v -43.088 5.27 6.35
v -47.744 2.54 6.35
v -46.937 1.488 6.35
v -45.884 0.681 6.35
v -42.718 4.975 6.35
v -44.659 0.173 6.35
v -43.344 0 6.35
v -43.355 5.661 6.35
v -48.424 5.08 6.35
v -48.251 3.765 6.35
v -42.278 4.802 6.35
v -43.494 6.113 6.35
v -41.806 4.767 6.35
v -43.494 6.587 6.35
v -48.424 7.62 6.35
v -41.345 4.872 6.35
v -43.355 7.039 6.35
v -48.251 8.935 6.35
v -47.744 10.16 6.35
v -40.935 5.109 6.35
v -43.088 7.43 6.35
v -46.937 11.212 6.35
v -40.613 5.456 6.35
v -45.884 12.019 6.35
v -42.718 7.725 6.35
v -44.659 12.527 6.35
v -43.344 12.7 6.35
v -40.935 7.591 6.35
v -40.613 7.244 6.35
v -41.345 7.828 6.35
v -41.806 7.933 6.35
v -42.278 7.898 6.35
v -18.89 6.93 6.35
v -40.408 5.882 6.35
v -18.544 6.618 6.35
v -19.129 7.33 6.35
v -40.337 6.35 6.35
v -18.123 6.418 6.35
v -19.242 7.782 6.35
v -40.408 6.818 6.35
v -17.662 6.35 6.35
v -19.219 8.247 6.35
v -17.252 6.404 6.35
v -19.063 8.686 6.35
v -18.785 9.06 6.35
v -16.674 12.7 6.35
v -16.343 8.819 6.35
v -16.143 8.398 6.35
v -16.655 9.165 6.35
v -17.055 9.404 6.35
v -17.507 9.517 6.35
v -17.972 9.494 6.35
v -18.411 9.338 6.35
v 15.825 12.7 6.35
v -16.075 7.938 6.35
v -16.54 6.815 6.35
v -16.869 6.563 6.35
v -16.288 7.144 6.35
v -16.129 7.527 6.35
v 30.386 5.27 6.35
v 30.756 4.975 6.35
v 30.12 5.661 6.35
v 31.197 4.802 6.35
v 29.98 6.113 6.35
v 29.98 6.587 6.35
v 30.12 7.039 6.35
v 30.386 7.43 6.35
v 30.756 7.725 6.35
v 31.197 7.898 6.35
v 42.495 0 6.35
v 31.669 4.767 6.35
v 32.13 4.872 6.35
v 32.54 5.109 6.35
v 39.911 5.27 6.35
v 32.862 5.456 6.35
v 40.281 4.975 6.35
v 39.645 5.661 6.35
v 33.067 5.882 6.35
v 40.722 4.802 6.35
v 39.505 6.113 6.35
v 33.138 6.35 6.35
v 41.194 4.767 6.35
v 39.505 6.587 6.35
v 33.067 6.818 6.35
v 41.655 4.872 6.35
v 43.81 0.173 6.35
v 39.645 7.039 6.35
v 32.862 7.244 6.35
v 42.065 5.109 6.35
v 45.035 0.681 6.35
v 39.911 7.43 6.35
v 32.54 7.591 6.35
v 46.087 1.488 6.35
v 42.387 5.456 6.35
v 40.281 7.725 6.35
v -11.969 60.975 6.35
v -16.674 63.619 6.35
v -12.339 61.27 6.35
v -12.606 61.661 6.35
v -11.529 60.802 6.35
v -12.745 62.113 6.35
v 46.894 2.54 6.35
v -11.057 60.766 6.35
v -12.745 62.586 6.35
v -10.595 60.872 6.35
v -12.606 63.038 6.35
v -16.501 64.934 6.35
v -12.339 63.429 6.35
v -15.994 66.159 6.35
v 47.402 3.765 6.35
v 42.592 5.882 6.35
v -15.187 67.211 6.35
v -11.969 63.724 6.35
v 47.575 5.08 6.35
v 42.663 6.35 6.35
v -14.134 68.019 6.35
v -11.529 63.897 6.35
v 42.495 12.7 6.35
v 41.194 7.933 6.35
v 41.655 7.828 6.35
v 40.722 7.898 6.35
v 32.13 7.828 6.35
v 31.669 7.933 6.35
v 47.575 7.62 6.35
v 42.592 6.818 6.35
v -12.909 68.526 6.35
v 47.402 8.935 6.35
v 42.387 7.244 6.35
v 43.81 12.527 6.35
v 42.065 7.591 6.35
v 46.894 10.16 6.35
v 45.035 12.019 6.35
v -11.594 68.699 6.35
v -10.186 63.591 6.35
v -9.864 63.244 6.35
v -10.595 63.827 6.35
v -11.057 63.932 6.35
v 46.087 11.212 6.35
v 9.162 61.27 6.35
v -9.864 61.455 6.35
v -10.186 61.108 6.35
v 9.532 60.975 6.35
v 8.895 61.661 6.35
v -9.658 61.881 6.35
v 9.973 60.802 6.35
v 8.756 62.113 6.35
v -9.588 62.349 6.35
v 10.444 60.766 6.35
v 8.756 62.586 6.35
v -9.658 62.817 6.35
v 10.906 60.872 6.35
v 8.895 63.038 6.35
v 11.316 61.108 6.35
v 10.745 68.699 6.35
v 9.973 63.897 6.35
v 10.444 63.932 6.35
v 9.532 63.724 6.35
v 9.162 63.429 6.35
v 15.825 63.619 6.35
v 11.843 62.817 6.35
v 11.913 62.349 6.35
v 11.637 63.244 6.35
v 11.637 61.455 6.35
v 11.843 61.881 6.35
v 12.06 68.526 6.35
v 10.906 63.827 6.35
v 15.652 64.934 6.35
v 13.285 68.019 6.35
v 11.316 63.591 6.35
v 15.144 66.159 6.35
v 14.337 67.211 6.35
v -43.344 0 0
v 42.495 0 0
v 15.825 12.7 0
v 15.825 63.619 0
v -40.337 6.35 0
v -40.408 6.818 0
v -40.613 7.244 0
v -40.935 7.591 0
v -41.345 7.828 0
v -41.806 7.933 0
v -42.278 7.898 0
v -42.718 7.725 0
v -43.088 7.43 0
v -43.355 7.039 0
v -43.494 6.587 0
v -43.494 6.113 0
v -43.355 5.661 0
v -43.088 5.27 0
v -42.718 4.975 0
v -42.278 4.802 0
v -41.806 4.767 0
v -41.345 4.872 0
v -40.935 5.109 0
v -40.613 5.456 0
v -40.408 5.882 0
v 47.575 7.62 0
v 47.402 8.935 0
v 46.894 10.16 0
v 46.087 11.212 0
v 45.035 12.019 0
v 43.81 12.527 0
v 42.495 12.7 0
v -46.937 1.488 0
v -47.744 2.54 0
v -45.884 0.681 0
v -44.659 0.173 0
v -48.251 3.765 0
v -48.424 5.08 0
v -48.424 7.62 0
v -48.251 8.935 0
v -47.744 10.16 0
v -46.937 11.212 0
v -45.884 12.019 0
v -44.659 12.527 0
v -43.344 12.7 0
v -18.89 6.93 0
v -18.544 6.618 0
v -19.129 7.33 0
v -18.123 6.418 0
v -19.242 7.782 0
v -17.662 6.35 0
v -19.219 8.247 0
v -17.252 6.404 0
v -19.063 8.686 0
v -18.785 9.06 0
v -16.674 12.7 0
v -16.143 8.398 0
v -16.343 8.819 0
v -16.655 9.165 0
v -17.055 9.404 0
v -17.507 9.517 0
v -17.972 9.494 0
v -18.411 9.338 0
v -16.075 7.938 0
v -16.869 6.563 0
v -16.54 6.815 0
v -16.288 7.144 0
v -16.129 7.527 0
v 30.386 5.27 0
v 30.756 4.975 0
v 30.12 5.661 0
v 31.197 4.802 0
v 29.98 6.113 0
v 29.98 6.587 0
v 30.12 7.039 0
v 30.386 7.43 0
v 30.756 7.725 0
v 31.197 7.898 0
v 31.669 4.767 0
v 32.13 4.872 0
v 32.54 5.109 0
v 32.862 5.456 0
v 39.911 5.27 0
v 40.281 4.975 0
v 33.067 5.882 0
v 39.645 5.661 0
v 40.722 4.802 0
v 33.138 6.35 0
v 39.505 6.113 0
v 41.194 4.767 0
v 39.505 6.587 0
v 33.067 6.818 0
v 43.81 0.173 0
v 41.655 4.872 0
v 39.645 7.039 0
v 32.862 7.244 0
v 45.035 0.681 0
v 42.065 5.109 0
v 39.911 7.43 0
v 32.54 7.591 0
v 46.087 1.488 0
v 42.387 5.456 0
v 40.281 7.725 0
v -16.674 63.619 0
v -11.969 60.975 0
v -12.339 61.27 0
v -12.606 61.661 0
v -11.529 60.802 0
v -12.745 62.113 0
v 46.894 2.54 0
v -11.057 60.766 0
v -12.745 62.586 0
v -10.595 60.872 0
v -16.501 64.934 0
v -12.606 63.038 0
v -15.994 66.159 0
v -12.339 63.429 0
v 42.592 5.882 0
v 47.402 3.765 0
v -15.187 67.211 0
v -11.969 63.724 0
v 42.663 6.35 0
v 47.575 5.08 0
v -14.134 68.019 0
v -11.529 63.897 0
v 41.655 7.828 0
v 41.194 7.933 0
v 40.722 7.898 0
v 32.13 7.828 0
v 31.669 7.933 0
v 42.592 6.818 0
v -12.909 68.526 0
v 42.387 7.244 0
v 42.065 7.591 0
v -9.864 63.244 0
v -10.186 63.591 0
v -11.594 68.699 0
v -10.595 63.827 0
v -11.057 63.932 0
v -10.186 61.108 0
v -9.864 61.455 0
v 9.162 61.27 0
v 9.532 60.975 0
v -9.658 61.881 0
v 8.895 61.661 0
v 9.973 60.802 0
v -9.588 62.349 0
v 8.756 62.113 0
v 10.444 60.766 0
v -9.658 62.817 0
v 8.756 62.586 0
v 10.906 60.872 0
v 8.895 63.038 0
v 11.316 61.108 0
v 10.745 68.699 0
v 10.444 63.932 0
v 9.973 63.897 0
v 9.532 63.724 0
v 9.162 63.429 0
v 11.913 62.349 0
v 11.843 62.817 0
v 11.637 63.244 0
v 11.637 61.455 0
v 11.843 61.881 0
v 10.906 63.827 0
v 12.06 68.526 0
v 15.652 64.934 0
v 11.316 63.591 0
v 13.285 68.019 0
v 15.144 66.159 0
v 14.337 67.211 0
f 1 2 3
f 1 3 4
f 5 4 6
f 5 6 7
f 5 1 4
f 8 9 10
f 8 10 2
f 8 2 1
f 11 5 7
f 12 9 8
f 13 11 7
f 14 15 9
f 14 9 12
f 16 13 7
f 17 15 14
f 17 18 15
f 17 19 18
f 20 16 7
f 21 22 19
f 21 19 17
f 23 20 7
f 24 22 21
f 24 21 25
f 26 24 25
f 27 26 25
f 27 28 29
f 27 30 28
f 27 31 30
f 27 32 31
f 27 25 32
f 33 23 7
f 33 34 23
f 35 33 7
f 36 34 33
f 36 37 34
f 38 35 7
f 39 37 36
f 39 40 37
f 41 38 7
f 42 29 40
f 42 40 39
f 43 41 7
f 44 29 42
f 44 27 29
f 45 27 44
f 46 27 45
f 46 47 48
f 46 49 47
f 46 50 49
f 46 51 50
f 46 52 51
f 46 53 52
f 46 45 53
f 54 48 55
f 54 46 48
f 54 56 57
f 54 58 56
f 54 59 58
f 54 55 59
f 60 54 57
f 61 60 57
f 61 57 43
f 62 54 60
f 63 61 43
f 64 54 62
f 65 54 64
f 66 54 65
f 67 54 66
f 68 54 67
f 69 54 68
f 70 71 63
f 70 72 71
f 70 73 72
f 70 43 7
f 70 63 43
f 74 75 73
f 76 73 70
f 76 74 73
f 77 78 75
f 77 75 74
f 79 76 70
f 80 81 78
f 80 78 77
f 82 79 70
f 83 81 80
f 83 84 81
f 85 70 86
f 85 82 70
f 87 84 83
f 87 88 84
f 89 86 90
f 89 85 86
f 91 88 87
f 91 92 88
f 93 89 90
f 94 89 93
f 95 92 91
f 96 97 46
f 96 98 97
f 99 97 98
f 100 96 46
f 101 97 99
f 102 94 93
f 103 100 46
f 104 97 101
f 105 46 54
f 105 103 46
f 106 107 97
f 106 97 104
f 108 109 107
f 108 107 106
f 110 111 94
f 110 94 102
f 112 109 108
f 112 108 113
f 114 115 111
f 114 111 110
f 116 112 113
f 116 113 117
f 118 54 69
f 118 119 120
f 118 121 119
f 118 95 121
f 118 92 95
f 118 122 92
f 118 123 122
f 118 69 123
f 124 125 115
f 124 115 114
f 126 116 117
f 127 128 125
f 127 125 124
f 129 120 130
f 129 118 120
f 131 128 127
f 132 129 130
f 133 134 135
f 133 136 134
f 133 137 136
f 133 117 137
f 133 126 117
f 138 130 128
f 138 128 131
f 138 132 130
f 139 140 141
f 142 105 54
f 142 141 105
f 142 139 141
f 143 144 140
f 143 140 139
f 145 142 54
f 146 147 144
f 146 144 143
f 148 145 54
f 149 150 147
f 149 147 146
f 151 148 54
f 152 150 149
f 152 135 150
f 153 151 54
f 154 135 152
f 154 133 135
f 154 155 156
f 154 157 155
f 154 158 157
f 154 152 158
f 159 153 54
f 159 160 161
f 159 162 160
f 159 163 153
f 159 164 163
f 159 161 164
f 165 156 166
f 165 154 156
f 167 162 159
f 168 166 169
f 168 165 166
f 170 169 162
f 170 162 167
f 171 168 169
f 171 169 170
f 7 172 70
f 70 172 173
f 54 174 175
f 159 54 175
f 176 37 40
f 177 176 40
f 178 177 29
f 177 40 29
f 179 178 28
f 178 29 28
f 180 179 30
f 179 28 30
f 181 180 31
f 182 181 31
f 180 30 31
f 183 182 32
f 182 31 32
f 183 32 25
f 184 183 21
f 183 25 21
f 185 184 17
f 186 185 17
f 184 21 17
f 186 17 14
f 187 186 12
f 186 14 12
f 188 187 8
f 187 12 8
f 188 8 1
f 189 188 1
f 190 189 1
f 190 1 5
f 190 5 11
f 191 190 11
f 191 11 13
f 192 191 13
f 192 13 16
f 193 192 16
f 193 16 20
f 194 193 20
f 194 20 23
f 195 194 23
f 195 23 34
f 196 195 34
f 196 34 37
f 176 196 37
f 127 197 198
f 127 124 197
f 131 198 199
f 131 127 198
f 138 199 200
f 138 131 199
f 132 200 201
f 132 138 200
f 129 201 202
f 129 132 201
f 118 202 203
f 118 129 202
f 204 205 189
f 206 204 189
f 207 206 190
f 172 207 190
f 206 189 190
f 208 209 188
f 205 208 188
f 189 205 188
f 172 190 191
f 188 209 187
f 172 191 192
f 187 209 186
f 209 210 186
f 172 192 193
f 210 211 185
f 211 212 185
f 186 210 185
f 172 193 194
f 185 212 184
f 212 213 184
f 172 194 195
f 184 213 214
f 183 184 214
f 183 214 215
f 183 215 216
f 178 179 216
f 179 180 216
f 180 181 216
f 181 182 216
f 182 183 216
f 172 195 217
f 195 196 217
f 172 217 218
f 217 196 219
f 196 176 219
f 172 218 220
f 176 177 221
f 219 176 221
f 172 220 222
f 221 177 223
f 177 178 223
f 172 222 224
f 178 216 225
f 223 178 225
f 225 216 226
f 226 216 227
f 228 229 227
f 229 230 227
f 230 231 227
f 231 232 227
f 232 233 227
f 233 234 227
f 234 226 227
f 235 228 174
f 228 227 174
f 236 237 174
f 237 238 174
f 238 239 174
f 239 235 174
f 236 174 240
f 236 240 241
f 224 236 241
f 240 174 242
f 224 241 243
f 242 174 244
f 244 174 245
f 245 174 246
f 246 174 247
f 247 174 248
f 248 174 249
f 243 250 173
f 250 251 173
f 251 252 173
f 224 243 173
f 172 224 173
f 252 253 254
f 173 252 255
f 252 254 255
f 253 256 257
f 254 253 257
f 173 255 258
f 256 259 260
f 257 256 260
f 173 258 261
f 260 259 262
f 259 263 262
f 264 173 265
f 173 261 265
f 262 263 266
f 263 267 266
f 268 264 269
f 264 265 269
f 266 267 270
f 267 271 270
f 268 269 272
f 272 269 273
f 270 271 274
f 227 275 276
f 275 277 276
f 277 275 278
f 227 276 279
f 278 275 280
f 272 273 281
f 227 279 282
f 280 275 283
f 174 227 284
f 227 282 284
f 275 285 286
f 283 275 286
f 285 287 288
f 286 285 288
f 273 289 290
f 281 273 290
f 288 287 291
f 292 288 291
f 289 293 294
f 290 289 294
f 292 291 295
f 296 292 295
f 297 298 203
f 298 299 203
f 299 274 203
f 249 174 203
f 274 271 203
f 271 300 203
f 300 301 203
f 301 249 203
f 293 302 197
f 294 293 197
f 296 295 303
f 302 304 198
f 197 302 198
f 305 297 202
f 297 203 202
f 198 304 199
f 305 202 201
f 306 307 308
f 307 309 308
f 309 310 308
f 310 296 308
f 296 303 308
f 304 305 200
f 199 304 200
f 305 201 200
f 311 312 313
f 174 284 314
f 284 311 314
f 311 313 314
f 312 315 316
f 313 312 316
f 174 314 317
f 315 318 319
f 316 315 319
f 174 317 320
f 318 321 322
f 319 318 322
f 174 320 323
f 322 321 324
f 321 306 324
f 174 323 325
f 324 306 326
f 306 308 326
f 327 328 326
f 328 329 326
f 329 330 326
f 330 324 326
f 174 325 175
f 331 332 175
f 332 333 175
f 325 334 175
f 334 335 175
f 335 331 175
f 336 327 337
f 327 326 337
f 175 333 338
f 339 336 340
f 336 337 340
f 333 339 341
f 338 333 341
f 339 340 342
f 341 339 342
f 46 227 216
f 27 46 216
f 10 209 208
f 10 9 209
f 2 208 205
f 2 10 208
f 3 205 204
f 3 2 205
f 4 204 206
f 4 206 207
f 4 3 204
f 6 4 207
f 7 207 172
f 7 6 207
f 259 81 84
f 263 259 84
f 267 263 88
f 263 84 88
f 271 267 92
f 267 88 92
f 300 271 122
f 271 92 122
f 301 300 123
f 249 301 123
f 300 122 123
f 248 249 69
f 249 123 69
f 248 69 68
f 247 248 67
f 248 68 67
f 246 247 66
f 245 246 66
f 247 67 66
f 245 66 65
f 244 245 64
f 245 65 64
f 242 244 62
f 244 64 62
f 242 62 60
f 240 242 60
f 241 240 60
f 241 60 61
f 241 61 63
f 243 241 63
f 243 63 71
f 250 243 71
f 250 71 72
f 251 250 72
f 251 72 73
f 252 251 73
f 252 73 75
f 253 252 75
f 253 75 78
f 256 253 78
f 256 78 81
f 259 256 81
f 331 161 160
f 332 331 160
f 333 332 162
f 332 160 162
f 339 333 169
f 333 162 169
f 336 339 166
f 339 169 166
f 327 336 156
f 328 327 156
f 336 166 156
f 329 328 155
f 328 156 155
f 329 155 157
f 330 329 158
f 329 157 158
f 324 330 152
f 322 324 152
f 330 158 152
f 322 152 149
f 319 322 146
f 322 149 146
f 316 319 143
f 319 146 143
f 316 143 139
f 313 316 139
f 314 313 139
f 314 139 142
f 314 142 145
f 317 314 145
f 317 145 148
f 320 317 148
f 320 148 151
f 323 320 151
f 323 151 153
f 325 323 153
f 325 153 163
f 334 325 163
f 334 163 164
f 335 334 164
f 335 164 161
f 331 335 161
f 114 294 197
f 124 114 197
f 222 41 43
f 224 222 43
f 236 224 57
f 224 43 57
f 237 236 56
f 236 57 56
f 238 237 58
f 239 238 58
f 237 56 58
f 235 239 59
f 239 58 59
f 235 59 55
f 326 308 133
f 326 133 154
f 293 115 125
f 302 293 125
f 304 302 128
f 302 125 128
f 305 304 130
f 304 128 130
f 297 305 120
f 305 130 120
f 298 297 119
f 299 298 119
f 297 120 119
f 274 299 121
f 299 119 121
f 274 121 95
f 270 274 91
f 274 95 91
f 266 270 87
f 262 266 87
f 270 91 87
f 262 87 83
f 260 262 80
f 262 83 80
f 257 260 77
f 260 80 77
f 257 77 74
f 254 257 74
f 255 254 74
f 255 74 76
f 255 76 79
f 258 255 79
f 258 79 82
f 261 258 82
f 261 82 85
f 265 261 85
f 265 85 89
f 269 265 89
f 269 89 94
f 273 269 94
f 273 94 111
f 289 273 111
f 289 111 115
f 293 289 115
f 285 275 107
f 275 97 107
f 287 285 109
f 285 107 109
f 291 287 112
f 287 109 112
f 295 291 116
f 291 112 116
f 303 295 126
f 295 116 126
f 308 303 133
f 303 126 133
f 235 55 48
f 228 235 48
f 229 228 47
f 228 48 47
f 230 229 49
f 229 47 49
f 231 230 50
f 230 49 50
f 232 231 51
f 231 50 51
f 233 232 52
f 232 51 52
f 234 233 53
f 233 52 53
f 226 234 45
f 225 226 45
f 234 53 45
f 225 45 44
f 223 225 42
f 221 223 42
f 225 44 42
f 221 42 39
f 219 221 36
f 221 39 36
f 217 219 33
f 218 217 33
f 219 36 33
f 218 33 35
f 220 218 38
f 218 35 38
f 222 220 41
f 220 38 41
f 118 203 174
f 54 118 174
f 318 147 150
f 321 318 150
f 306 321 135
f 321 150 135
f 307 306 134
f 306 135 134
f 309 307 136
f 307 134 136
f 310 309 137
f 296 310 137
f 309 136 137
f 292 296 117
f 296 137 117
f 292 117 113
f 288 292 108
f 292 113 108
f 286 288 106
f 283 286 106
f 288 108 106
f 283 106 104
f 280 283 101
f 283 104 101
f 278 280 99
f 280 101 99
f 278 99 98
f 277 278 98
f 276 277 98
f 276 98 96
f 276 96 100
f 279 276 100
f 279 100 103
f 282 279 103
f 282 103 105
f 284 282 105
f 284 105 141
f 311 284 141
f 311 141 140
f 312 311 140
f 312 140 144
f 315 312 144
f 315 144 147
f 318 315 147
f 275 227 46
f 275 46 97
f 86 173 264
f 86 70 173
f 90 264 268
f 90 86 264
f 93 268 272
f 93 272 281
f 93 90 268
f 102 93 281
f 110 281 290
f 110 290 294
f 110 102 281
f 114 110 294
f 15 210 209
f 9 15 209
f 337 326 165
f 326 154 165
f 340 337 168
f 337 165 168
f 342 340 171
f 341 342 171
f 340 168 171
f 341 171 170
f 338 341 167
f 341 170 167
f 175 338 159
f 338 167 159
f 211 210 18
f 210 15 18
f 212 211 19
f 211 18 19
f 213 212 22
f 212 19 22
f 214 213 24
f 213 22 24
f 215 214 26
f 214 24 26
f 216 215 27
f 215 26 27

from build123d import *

# Parameters (mm, degrees)
F0_W     = 32.4993
F0_H     = 55.99938
F1_DEPTH = 6.35
F2_R     = 1.5875
F3_DEPTH = 25.4
F4_R     = 5.08
F6_DEPTH = 25.4


with BuildPart() as f1:
    # F0 (on Top) → F1 (new body)
    with BuildSketch(Plane.XY):
        Polygon((-48.424426, 12.7), (-48.424426, 0), (47.574874, 0), (47.574874, 12.7), (15.824874, 12.7), (-16.674426, 12.7), align=None)
        with Locations((-0.424776, 40.69969)):
            Rectangle(F0_W, F0_H)
    extrude(amount=F1_DEPTH)

    # F2 (on face) → F3 (cut)
    with BuildSketch(Plane.XY.offset(6.35)):
        with Locations((41.075014, 6.35)):
            Circle(F2_R)
        with Locations((-41.924566, 6.35)):
            Circle(F2_R)
        with Locations((-11.175326, 62.34938)):
            Circle(F2_R)
        with Locations((10.325774, 62.34938)):
            Circle(F2_R)
    extrude(amount=-F3_DEPTH, mode=Mode.SUBTRACT)

    # F4
    f4_edges = [f1.edges().sort_by_distance(p)[0] for p in [
        (47.574874, 12.7, 3.175),
        (47.574874, 0, 3.175),
        (-48.424426, 0, 3.175),
        (-48.424426, 12.7, 3.175),
        (15.824874, 68.69938, 3.175),
        (-16.674426, 68.69938, 3.175),
    ]]
    fillet(f4_edges, radius=F4_R)

    # F5 (on face) → F6 (cut)
    with BuildSketch(Plane.XY.offset(6.35)):
        with BuildLine():
            ThreePointArc((-16.074986, 7.9375), (-18.785018, 9.060032), (-17.662486, 6.35))
            ThreePointArc((-17.662486, 6.35), (-16.539954, 6.814968), (-16.074986, 7.9375))
        make_face()
        with BuildLine():
            ThreePointArc((29.962514, 6.35), (31.550014, 4.7625), (33.137514, 6.35))
            ThreePointArc((33.137514, 6.35), (31.550014, 7.9375), (29.962514, 6.35))
        make_face()
    extrude(amount=-F6_DEPTH, mode=Mode.SUBTRACT)


solid = f1.part
